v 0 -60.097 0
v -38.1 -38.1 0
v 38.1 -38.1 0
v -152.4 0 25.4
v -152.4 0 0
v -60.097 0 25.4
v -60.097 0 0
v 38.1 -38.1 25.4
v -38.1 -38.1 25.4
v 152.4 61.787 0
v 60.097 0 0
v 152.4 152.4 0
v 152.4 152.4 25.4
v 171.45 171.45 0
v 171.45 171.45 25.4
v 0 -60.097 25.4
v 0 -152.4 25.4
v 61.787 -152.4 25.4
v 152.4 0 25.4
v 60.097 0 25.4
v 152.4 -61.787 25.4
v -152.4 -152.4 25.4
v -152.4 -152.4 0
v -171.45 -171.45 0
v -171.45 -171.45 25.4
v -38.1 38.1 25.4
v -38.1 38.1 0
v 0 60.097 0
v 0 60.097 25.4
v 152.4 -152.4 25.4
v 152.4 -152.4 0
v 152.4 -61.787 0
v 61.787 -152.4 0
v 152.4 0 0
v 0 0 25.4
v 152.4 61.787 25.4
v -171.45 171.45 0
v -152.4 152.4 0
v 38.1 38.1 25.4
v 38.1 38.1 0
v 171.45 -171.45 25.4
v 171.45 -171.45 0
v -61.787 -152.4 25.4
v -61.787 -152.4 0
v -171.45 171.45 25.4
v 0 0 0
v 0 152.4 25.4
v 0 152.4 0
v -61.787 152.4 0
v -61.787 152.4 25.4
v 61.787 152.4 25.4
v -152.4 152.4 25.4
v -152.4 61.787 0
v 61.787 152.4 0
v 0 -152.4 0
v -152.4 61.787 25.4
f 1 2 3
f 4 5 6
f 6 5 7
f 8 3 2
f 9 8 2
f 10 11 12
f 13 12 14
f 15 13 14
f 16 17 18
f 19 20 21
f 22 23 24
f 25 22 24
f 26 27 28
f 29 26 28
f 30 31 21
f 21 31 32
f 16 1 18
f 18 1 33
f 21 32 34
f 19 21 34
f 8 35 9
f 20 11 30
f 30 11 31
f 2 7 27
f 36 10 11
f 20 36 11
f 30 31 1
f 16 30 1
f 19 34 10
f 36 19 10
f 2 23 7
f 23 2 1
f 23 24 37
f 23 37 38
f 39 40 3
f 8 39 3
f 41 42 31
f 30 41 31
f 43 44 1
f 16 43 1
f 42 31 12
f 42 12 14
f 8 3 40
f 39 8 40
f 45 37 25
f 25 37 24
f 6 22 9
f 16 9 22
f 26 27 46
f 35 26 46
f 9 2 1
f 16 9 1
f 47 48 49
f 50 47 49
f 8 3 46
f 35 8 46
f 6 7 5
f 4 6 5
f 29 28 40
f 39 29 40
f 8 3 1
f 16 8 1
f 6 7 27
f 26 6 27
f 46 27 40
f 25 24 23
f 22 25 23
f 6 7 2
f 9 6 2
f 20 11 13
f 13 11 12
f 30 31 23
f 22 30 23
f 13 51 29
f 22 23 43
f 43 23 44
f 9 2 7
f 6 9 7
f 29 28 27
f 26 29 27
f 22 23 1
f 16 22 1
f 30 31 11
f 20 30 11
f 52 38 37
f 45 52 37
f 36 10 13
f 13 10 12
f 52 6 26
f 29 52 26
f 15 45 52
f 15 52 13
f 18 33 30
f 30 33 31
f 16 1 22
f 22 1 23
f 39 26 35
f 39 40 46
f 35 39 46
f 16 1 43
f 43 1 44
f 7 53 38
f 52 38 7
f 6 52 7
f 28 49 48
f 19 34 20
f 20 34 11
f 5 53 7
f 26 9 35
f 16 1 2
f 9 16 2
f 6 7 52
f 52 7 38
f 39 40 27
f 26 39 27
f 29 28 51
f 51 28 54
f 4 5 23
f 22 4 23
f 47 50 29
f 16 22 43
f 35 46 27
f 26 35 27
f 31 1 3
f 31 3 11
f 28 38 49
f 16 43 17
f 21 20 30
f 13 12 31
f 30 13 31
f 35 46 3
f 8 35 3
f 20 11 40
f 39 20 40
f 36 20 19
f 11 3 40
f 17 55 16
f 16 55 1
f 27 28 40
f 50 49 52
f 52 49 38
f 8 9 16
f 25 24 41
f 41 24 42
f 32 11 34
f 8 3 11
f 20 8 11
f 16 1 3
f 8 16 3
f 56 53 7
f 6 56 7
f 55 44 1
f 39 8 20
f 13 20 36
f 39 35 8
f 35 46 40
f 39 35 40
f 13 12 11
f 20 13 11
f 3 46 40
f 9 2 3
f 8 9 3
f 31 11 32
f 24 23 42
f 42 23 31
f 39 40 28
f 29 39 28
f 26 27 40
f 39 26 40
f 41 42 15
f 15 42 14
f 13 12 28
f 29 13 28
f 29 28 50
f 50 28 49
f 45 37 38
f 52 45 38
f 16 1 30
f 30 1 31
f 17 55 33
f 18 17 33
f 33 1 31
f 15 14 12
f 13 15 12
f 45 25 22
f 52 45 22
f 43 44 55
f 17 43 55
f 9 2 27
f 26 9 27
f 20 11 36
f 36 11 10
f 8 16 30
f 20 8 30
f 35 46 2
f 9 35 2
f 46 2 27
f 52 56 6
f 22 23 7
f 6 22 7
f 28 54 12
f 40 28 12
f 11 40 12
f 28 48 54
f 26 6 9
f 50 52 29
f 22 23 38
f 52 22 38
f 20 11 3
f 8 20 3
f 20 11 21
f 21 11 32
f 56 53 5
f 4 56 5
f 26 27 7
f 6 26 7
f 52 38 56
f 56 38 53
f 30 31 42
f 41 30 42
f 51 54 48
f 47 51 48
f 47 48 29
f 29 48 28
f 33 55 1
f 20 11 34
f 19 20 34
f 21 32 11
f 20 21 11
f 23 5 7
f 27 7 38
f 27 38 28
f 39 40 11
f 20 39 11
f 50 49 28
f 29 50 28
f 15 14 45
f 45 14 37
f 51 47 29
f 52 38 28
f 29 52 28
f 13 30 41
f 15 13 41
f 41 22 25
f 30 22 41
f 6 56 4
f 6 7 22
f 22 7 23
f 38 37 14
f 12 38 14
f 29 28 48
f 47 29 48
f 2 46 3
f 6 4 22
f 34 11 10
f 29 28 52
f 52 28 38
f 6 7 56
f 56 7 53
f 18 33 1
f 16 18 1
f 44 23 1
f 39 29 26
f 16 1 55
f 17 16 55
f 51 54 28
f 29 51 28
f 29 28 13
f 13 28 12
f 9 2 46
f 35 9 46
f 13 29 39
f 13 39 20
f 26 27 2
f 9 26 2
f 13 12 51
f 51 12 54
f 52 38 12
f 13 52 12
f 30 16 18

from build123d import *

# Parameters (mm, degrees)
F4_DEPTH  = 25.4
F5_DEPTH  = 25.4
F6_DEPTH  = 25.4
F7_DEPTH  = 25.4
F8_DEPTH  = 25.4
F9_DEPTH  = 25.4
F10_DEPTH = 25.4
F11_DEPTH = 25.4
F13_DEPTH = 25.4
F15_DEPTH = 25.4
F16_DEPTH = 25.4
F17_DEPTH = 25.4
F19_DEPTH = 25.4
F20_DEPTH = 25.4


with BuildPart() as f4:
    # F2 (on face) → F4 (new body)
    with BuildSketch(Plane.XY):
        Polygon((38.1, 38.1), (-38.1, 38.1), (0, 0), align=None)
    extrude(amount=F4_DEPTH)


with BuildPart() as f5:
    # F2 (on face) → F5 (new body)
    with BuildSketch(Plane.XY):
        Polygon((0, 0), (-38.1, 38.1), (-38.1, -38.1), align=None)
    extrude(amount=F5_DEPTH)


with BuildPart() as f6:
    # F2 (on face) → F6 (new body)
    with BuildSketch(Plane.XY):
        Polygon((0, 0), (-38.1, -38.1), (38.1, -38.1), align=None)
    extrude(amount=F6_DEPTH)


with BuildPart() as f7:
    # F2 (on face) → F7 (new body)
    with BuildSketch(Plane.XY):
        Polygon((38.1, -38.1), (38.1, 38.1), (0, 0), align=None)
    extrude(amount=F7_DEPTH)


with BuildPart() as f8:
    # F3 (on face) → F8 (new body)
    with BuildSketch(Plane.XY):
        Polygon((0, 60.097045), (-38.1, 38.1), (38.1, 38.1), align=None)
    extrude(amount=F8_DEPTH)


with BuildPart() as f9:
    # F3 (on face) → F9 (new body)
    with BuildSketch(Plane.XY):
        Polygon((-38.1, -38.1), (-38.1, 38.1), (-60.097045, 0), align=None)
    extrude(amount=F9_DEPTH)


with BuildPart() as f10:
    # F3 (on face) → F10 (new body)
    with BuildSketch(Plane.XY):
        Polygon((38.1, -38.1), (-38.1, -38.1), (0, -60.097045), align=None)
    extrude(amount=F10_DEPTH)


with BuildPart() as f11:
    # F3 (on face) → F11 (new body)
    with BuildSketch(Plane.XY):
        Polygon((60.097045, 0), (38.1, 38.1), (38.1, -38.1), align=None)
    extrude(amount=F11_DEPTH)


with BuildPart() as f13:
    # F12 (on face) → F13 (new body)
    with BuildSketch(Plane.XY):
        Polygon((-38.1, 38.1), (0, 60.097045), (-152.4, 152.4), (-60.097045, 0), align=None)
        Polygon((152.4, 152.4), (0, 60.097045), (38.1, 38.1), (60.097045, 0), align=None)
        Polygon((-38.1, -38.1), (-60.097045, 0), (-152.4, -152.4), (0, -60.097045), align=None)
        Polygon((152.4, -152.4), (60.097045, 0), (38.1, -38.1), (0, -60.097045), align=None)
    extrude(amount=F13_DEPTH)


with BuildPart() as f15:
    # F14 (on face) → F15 (new body)
    with BuildSketch(Plane.XY):
        Polygon((0, -60.097045), (-152.4, -152.4), (-61.787442, -152.4), align=None)
        Polygon((-60.097045, 0), (-152.4, 61.787442), (-152.4, 0), align=None)
        Polygon((-61.787442, 152.4), (-152.4, 152.4), (0, 60.097045), align=None)
        Polygon((0, 152.4), (0, 60.097045), (61.787442, 152.4), align=None)
        Polygon((152.4, 0), (152.4, 61.787442), (60.097045, 0), align=None)
        Polygon((152.4, -61.787442), (60.097045, 0), (152.4, -152.4), align=None)
        Polygon((152.4, -152.4), (0, -60.097045), (61.787442, -152.4), align=None)
    extrude(amount=F15_DEPTH)


with BuildPart() as f16:
    # F14 (on face) → F16 (new body)
    with BuildSketch(Plane.XY):
        Polygon((0, -60.097045), (-61.787442, -152.4), (0, -152.4), align=None)
        Polygon((-152.4, -152.4), (-60.097045, 0), (-152.4, -61.787442), align=None)
        Polygon((0, 152.4), (-61.787442, 152.4), (0, 60.097045), align=None)
        Polygon((152.4, 0), (60.097045, 0), (152.4, -61.787442), align=None)
        Polygon((152.4, 61.787442), (152.4, 152.4), (60.097045, 0), align=None)
        Polygon((61.787442, 152.4), (0, 60.097045), (152.4, 152.4), align=None)
        Polygon((-60.097045, 0), (-152.4, 152.4), (-152.4, 61.787442), align=None)
        Polygon((-152.4, -61.787442), (-60.097045, 0), (-152.4, 0), align=None)
    extrude(amount=F16_DEPTH)


with BuildPart() as f17:
    # F14 (on face) → F17 (new body)
    with BuildSketch(Plane.XY):
        Polygon((61.787442, -152.4), (0, -60.097045), (0, -152.4), align=None)
    extrude(amount=F17_DEPTH)


with BuildPart() as f19:
    # F18 (on face) → F19 (new body)
    with BuildSketch(Plane.XY):
        Polygon((-152.4, 61.787442), (-152.4, 152.4), (-171.45, 171.45), (-171.45, -171.45), (-152.4, -152.4), (-152.4, -61.787442), (-152.4, 0), align=None)
        Polygon((171.45, -171.45), (171.45, 171.45), (152.4, 152.4), (152.4, 61.787442), (152.4, 0), (152.4, -61.787442), (152.4, -152.4), align=None)
    extrude(amount=F19_DEPTH)


with BuildPart() as f20:
    # F18 (on face) → F20 (new body)
    with BuildSketch(Plane.XY):
        Polygon((-171.45, 171.45), (-152.4, 152.4), (-61.787442, 152.4), (0, 152.4), (61.787442, 152.4), (152.4, 152.4), (171.45, 171.45), align=None)
        Polygon((-152.4, -152.4), (-171.45, -171.45), (171.45, -171.45), (152.4, -152.4), (61.787442, -152.4), (0, -152.4), (-61.787442, -152.4), align=None)
    extrude(amount=F20_DEPTH)


solid = Compound([f4.part, f5.part, f6.part, f7.part, f8.part, f9.part, f10.part, f11.part, f13.part, f15.part, f16.part, f17.part, f19.part, f20.part])
